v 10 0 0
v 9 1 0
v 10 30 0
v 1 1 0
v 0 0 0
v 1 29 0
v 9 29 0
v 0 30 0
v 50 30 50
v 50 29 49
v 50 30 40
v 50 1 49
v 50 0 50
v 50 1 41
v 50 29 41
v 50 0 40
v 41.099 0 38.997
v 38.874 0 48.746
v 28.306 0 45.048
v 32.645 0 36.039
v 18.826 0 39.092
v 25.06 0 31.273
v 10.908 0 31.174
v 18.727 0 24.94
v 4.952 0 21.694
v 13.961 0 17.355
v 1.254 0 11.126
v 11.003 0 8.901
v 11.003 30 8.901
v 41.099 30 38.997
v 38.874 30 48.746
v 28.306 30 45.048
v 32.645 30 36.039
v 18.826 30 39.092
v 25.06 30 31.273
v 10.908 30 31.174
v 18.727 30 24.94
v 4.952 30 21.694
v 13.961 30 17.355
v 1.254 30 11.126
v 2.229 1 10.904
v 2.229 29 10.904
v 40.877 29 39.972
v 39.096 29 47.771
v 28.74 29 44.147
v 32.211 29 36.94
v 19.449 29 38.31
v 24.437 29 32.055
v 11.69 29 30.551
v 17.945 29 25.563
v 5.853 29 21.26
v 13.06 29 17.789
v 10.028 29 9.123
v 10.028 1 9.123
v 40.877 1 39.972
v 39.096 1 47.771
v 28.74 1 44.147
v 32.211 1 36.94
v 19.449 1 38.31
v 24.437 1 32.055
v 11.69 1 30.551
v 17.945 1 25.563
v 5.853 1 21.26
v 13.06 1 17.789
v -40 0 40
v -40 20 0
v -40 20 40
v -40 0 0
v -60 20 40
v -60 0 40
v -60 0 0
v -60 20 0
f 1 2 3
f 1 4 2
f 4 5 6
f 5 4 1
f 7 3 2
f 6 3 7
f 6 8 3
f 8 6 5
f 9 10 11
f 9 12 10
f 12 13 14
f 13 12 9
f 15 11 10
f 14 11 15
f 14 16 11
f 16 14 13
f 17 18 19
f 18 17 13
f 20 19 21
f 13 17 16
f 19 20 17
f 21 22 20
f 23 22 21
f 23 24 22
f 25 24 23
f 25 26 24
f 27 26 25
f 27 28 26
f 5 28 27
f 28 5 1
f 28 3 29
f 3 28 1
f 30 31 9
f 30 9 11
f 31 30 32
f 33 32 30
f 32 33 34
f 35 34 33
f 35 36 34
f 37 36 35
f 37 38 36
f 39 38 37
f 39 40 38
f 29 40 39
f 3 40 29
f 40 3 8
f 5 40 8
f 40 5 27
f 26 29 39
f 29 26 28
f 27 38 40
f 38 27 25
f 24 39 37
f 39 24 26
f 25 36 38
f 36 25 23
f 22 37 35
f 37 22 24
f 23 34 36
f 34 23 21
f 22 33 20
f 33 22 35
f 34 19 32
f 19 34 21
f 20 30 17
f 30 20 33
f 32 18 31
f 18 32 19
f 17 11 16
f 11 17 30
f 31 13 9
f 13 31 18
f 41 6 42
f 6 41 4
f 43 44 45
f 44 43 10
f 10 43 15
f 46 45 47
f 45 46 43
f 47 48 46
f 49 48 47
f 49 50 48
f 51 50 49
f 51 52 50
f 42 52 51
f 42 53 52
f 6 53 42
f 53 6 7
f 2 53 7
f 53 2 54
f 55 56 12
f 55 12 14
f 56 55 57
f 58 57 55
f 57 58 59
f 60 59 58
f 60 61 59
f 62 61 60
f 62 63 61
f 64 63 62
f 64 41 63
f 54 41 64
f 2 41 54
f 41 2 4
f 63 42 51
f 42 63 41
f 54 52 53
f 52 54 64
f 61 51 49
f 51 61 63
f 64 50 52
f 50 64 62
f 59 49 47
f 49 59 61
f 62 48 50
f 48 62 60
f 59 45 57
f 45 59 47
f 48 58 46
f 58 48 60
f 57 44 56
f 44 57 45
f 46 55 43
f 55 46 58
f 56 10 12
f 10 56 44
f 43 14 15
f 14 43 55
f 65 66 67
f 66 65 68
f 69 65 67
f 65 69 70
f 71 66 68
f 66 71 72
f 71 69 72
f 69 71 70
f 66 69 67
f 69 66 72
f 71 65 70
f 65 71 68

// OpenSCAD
// file: ../math/vect.scad
function vect_scalar_sum(v, incr) = [for (i = [0: len(v) - 1]) v[i] + incr];

function vSize(size) = (!is_list(size)) ? [size, size, size]: size; 

function vect_rotate2d(vect, b) = [
    cos(b) * vect[0] - sin(b) * vect[1],
    sin(b) * vect[0] + cos(b) * vect[1]
];
// main file
use <../math/vect.scad>

// bent_cube([10, 20], 90, 20);
// rotate_to_bent_face(90, 20){
//     cube([20, 20, 40]);
// }


module bent_2d(angle, r){
    mirror([0, 1 ,0])
    mirror([1, 0, 0])
        rotate([90, 0, 0])
            //translate([-r, 0])
                rotate_extrude(convexity = 10, angle = angle){
                    translate([r, 0])
                        children();
                }
}


module bent_cube(size, angle, r){
    translate([size[0] + r, 0, 0])
        bent_2d(angle, r)
            square([size[0], size[1]]);
}

// bent_tube([10, 50], [8, 48], 90, 20);

module bent_tube(size, size1, angle, r){
    translate([size[0] + r, 0, 0])
        bent_2d(angle, r){
            difference(){
                square([size[0], size[1]]);
                    translate([(size[0] - size1[0])/2, (size[1] - size1[1])/2])
                        square([size1[0], size1[1]]);
            }
        }
}

module rotate_to_bent_face(x, angle, r){
    //translate([result[1] * 2, 0, 0])
        //rotate([0, angle, 0])
            translate([ -r - x, 0])
                children();
}
 
bent_tube([10, 30], [8, 28], 90, 40);
rotate_to_bent_face(20, 90, 40){
    cube([20, 20, 40]);
}

// rotate_extrude(convexity = 10, angle = 90)
// square([10, 20]);

// mirror([1, 0, 0])
// angle = 45;
// rotate([-90, 0, 0])
// rotate_extrude(convexity = 10, angle = angle)
// translate ([-30, 0])
// polygon([[15,10], [30,10], [15, 15]]);
